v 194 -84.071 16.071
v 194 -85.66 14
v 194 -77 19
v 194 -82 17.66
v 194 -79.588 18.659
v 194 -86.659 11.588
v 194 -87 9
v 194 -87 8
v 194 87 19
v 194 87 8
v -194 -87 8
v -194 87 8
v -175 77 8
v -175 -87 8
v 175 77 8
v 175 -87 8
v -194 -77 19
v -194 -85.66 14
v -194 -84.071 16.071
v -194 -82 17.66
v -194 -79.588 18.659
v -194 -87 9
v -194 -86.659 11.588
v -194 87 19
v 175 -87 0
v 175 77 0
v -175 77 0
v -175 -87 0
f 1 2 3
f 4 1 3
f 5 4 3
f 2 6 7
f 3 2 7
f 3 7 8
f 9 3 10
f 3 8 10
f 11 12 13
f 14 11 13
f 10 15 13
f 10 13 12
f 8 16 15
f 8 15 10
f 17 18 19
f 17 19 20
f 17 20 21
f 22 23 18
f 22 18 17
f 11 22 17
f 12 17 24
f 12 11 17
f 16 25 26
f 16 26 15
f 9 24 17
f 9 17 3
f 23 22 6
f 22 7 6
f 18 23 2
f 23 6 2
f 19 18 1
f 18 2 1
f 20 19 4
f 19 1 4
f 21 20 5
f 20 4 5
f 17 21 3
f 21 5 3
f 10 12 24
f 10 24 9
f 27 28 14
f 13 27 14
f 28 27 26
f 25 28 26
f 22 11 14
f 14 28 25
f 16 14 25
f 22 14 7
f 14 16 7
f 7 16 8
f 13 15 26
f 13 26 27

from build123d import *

# Parameters (mm, degrees)
F0_W     = 388
F0_H     = 174
F1_DEPTH = 19
F2_W     = 19
F2_H     = 8
F3_DEPTH = 178
F4_W     = 350
F4_H     = 8
F5_DEPTH = 10
F6_R     = 10


with BuildPart() as f1:
    # F0 (on Top) → F1 (new body)
    with BuildSketch(Plane.XY):
        Rectangle(F0_W, F0_H)
    extrude(amount=F1_DEPTH)

    # F2 (on face) → F3 (cut)
    with BuildSketch(Plane.XZ.offset(87)):
        with Locations((184.5, 4)):
            Rectangle(F2_W, F2_H)
        with Locations((-184.5, 4)):
            Rectangle(F2_W, F2_H)
    extrude(amount=-F3_DEPTH, mode=Mode.SUBTRACT)

    # F4 (on face) → F5 (cut)
    with BuildSketch(Plane(origin=(0, 87, 0), x_dir=(-1, 0, 0), z_dir=(0, 1, 0))):
        with Locations((0, 4)):
            Rectangle(F4_W, F4_H)
    extrude(amount=-F5_DEPTH, mode=Mode.SUBTRACT)

    # F6
    f6_edges = [f1.edges().sort_by_distance(p)[0] for p in [
        (0, -87, 19),
    ]]
    fillet(f6_edges, radius=F6_R)


solid = f1.part
